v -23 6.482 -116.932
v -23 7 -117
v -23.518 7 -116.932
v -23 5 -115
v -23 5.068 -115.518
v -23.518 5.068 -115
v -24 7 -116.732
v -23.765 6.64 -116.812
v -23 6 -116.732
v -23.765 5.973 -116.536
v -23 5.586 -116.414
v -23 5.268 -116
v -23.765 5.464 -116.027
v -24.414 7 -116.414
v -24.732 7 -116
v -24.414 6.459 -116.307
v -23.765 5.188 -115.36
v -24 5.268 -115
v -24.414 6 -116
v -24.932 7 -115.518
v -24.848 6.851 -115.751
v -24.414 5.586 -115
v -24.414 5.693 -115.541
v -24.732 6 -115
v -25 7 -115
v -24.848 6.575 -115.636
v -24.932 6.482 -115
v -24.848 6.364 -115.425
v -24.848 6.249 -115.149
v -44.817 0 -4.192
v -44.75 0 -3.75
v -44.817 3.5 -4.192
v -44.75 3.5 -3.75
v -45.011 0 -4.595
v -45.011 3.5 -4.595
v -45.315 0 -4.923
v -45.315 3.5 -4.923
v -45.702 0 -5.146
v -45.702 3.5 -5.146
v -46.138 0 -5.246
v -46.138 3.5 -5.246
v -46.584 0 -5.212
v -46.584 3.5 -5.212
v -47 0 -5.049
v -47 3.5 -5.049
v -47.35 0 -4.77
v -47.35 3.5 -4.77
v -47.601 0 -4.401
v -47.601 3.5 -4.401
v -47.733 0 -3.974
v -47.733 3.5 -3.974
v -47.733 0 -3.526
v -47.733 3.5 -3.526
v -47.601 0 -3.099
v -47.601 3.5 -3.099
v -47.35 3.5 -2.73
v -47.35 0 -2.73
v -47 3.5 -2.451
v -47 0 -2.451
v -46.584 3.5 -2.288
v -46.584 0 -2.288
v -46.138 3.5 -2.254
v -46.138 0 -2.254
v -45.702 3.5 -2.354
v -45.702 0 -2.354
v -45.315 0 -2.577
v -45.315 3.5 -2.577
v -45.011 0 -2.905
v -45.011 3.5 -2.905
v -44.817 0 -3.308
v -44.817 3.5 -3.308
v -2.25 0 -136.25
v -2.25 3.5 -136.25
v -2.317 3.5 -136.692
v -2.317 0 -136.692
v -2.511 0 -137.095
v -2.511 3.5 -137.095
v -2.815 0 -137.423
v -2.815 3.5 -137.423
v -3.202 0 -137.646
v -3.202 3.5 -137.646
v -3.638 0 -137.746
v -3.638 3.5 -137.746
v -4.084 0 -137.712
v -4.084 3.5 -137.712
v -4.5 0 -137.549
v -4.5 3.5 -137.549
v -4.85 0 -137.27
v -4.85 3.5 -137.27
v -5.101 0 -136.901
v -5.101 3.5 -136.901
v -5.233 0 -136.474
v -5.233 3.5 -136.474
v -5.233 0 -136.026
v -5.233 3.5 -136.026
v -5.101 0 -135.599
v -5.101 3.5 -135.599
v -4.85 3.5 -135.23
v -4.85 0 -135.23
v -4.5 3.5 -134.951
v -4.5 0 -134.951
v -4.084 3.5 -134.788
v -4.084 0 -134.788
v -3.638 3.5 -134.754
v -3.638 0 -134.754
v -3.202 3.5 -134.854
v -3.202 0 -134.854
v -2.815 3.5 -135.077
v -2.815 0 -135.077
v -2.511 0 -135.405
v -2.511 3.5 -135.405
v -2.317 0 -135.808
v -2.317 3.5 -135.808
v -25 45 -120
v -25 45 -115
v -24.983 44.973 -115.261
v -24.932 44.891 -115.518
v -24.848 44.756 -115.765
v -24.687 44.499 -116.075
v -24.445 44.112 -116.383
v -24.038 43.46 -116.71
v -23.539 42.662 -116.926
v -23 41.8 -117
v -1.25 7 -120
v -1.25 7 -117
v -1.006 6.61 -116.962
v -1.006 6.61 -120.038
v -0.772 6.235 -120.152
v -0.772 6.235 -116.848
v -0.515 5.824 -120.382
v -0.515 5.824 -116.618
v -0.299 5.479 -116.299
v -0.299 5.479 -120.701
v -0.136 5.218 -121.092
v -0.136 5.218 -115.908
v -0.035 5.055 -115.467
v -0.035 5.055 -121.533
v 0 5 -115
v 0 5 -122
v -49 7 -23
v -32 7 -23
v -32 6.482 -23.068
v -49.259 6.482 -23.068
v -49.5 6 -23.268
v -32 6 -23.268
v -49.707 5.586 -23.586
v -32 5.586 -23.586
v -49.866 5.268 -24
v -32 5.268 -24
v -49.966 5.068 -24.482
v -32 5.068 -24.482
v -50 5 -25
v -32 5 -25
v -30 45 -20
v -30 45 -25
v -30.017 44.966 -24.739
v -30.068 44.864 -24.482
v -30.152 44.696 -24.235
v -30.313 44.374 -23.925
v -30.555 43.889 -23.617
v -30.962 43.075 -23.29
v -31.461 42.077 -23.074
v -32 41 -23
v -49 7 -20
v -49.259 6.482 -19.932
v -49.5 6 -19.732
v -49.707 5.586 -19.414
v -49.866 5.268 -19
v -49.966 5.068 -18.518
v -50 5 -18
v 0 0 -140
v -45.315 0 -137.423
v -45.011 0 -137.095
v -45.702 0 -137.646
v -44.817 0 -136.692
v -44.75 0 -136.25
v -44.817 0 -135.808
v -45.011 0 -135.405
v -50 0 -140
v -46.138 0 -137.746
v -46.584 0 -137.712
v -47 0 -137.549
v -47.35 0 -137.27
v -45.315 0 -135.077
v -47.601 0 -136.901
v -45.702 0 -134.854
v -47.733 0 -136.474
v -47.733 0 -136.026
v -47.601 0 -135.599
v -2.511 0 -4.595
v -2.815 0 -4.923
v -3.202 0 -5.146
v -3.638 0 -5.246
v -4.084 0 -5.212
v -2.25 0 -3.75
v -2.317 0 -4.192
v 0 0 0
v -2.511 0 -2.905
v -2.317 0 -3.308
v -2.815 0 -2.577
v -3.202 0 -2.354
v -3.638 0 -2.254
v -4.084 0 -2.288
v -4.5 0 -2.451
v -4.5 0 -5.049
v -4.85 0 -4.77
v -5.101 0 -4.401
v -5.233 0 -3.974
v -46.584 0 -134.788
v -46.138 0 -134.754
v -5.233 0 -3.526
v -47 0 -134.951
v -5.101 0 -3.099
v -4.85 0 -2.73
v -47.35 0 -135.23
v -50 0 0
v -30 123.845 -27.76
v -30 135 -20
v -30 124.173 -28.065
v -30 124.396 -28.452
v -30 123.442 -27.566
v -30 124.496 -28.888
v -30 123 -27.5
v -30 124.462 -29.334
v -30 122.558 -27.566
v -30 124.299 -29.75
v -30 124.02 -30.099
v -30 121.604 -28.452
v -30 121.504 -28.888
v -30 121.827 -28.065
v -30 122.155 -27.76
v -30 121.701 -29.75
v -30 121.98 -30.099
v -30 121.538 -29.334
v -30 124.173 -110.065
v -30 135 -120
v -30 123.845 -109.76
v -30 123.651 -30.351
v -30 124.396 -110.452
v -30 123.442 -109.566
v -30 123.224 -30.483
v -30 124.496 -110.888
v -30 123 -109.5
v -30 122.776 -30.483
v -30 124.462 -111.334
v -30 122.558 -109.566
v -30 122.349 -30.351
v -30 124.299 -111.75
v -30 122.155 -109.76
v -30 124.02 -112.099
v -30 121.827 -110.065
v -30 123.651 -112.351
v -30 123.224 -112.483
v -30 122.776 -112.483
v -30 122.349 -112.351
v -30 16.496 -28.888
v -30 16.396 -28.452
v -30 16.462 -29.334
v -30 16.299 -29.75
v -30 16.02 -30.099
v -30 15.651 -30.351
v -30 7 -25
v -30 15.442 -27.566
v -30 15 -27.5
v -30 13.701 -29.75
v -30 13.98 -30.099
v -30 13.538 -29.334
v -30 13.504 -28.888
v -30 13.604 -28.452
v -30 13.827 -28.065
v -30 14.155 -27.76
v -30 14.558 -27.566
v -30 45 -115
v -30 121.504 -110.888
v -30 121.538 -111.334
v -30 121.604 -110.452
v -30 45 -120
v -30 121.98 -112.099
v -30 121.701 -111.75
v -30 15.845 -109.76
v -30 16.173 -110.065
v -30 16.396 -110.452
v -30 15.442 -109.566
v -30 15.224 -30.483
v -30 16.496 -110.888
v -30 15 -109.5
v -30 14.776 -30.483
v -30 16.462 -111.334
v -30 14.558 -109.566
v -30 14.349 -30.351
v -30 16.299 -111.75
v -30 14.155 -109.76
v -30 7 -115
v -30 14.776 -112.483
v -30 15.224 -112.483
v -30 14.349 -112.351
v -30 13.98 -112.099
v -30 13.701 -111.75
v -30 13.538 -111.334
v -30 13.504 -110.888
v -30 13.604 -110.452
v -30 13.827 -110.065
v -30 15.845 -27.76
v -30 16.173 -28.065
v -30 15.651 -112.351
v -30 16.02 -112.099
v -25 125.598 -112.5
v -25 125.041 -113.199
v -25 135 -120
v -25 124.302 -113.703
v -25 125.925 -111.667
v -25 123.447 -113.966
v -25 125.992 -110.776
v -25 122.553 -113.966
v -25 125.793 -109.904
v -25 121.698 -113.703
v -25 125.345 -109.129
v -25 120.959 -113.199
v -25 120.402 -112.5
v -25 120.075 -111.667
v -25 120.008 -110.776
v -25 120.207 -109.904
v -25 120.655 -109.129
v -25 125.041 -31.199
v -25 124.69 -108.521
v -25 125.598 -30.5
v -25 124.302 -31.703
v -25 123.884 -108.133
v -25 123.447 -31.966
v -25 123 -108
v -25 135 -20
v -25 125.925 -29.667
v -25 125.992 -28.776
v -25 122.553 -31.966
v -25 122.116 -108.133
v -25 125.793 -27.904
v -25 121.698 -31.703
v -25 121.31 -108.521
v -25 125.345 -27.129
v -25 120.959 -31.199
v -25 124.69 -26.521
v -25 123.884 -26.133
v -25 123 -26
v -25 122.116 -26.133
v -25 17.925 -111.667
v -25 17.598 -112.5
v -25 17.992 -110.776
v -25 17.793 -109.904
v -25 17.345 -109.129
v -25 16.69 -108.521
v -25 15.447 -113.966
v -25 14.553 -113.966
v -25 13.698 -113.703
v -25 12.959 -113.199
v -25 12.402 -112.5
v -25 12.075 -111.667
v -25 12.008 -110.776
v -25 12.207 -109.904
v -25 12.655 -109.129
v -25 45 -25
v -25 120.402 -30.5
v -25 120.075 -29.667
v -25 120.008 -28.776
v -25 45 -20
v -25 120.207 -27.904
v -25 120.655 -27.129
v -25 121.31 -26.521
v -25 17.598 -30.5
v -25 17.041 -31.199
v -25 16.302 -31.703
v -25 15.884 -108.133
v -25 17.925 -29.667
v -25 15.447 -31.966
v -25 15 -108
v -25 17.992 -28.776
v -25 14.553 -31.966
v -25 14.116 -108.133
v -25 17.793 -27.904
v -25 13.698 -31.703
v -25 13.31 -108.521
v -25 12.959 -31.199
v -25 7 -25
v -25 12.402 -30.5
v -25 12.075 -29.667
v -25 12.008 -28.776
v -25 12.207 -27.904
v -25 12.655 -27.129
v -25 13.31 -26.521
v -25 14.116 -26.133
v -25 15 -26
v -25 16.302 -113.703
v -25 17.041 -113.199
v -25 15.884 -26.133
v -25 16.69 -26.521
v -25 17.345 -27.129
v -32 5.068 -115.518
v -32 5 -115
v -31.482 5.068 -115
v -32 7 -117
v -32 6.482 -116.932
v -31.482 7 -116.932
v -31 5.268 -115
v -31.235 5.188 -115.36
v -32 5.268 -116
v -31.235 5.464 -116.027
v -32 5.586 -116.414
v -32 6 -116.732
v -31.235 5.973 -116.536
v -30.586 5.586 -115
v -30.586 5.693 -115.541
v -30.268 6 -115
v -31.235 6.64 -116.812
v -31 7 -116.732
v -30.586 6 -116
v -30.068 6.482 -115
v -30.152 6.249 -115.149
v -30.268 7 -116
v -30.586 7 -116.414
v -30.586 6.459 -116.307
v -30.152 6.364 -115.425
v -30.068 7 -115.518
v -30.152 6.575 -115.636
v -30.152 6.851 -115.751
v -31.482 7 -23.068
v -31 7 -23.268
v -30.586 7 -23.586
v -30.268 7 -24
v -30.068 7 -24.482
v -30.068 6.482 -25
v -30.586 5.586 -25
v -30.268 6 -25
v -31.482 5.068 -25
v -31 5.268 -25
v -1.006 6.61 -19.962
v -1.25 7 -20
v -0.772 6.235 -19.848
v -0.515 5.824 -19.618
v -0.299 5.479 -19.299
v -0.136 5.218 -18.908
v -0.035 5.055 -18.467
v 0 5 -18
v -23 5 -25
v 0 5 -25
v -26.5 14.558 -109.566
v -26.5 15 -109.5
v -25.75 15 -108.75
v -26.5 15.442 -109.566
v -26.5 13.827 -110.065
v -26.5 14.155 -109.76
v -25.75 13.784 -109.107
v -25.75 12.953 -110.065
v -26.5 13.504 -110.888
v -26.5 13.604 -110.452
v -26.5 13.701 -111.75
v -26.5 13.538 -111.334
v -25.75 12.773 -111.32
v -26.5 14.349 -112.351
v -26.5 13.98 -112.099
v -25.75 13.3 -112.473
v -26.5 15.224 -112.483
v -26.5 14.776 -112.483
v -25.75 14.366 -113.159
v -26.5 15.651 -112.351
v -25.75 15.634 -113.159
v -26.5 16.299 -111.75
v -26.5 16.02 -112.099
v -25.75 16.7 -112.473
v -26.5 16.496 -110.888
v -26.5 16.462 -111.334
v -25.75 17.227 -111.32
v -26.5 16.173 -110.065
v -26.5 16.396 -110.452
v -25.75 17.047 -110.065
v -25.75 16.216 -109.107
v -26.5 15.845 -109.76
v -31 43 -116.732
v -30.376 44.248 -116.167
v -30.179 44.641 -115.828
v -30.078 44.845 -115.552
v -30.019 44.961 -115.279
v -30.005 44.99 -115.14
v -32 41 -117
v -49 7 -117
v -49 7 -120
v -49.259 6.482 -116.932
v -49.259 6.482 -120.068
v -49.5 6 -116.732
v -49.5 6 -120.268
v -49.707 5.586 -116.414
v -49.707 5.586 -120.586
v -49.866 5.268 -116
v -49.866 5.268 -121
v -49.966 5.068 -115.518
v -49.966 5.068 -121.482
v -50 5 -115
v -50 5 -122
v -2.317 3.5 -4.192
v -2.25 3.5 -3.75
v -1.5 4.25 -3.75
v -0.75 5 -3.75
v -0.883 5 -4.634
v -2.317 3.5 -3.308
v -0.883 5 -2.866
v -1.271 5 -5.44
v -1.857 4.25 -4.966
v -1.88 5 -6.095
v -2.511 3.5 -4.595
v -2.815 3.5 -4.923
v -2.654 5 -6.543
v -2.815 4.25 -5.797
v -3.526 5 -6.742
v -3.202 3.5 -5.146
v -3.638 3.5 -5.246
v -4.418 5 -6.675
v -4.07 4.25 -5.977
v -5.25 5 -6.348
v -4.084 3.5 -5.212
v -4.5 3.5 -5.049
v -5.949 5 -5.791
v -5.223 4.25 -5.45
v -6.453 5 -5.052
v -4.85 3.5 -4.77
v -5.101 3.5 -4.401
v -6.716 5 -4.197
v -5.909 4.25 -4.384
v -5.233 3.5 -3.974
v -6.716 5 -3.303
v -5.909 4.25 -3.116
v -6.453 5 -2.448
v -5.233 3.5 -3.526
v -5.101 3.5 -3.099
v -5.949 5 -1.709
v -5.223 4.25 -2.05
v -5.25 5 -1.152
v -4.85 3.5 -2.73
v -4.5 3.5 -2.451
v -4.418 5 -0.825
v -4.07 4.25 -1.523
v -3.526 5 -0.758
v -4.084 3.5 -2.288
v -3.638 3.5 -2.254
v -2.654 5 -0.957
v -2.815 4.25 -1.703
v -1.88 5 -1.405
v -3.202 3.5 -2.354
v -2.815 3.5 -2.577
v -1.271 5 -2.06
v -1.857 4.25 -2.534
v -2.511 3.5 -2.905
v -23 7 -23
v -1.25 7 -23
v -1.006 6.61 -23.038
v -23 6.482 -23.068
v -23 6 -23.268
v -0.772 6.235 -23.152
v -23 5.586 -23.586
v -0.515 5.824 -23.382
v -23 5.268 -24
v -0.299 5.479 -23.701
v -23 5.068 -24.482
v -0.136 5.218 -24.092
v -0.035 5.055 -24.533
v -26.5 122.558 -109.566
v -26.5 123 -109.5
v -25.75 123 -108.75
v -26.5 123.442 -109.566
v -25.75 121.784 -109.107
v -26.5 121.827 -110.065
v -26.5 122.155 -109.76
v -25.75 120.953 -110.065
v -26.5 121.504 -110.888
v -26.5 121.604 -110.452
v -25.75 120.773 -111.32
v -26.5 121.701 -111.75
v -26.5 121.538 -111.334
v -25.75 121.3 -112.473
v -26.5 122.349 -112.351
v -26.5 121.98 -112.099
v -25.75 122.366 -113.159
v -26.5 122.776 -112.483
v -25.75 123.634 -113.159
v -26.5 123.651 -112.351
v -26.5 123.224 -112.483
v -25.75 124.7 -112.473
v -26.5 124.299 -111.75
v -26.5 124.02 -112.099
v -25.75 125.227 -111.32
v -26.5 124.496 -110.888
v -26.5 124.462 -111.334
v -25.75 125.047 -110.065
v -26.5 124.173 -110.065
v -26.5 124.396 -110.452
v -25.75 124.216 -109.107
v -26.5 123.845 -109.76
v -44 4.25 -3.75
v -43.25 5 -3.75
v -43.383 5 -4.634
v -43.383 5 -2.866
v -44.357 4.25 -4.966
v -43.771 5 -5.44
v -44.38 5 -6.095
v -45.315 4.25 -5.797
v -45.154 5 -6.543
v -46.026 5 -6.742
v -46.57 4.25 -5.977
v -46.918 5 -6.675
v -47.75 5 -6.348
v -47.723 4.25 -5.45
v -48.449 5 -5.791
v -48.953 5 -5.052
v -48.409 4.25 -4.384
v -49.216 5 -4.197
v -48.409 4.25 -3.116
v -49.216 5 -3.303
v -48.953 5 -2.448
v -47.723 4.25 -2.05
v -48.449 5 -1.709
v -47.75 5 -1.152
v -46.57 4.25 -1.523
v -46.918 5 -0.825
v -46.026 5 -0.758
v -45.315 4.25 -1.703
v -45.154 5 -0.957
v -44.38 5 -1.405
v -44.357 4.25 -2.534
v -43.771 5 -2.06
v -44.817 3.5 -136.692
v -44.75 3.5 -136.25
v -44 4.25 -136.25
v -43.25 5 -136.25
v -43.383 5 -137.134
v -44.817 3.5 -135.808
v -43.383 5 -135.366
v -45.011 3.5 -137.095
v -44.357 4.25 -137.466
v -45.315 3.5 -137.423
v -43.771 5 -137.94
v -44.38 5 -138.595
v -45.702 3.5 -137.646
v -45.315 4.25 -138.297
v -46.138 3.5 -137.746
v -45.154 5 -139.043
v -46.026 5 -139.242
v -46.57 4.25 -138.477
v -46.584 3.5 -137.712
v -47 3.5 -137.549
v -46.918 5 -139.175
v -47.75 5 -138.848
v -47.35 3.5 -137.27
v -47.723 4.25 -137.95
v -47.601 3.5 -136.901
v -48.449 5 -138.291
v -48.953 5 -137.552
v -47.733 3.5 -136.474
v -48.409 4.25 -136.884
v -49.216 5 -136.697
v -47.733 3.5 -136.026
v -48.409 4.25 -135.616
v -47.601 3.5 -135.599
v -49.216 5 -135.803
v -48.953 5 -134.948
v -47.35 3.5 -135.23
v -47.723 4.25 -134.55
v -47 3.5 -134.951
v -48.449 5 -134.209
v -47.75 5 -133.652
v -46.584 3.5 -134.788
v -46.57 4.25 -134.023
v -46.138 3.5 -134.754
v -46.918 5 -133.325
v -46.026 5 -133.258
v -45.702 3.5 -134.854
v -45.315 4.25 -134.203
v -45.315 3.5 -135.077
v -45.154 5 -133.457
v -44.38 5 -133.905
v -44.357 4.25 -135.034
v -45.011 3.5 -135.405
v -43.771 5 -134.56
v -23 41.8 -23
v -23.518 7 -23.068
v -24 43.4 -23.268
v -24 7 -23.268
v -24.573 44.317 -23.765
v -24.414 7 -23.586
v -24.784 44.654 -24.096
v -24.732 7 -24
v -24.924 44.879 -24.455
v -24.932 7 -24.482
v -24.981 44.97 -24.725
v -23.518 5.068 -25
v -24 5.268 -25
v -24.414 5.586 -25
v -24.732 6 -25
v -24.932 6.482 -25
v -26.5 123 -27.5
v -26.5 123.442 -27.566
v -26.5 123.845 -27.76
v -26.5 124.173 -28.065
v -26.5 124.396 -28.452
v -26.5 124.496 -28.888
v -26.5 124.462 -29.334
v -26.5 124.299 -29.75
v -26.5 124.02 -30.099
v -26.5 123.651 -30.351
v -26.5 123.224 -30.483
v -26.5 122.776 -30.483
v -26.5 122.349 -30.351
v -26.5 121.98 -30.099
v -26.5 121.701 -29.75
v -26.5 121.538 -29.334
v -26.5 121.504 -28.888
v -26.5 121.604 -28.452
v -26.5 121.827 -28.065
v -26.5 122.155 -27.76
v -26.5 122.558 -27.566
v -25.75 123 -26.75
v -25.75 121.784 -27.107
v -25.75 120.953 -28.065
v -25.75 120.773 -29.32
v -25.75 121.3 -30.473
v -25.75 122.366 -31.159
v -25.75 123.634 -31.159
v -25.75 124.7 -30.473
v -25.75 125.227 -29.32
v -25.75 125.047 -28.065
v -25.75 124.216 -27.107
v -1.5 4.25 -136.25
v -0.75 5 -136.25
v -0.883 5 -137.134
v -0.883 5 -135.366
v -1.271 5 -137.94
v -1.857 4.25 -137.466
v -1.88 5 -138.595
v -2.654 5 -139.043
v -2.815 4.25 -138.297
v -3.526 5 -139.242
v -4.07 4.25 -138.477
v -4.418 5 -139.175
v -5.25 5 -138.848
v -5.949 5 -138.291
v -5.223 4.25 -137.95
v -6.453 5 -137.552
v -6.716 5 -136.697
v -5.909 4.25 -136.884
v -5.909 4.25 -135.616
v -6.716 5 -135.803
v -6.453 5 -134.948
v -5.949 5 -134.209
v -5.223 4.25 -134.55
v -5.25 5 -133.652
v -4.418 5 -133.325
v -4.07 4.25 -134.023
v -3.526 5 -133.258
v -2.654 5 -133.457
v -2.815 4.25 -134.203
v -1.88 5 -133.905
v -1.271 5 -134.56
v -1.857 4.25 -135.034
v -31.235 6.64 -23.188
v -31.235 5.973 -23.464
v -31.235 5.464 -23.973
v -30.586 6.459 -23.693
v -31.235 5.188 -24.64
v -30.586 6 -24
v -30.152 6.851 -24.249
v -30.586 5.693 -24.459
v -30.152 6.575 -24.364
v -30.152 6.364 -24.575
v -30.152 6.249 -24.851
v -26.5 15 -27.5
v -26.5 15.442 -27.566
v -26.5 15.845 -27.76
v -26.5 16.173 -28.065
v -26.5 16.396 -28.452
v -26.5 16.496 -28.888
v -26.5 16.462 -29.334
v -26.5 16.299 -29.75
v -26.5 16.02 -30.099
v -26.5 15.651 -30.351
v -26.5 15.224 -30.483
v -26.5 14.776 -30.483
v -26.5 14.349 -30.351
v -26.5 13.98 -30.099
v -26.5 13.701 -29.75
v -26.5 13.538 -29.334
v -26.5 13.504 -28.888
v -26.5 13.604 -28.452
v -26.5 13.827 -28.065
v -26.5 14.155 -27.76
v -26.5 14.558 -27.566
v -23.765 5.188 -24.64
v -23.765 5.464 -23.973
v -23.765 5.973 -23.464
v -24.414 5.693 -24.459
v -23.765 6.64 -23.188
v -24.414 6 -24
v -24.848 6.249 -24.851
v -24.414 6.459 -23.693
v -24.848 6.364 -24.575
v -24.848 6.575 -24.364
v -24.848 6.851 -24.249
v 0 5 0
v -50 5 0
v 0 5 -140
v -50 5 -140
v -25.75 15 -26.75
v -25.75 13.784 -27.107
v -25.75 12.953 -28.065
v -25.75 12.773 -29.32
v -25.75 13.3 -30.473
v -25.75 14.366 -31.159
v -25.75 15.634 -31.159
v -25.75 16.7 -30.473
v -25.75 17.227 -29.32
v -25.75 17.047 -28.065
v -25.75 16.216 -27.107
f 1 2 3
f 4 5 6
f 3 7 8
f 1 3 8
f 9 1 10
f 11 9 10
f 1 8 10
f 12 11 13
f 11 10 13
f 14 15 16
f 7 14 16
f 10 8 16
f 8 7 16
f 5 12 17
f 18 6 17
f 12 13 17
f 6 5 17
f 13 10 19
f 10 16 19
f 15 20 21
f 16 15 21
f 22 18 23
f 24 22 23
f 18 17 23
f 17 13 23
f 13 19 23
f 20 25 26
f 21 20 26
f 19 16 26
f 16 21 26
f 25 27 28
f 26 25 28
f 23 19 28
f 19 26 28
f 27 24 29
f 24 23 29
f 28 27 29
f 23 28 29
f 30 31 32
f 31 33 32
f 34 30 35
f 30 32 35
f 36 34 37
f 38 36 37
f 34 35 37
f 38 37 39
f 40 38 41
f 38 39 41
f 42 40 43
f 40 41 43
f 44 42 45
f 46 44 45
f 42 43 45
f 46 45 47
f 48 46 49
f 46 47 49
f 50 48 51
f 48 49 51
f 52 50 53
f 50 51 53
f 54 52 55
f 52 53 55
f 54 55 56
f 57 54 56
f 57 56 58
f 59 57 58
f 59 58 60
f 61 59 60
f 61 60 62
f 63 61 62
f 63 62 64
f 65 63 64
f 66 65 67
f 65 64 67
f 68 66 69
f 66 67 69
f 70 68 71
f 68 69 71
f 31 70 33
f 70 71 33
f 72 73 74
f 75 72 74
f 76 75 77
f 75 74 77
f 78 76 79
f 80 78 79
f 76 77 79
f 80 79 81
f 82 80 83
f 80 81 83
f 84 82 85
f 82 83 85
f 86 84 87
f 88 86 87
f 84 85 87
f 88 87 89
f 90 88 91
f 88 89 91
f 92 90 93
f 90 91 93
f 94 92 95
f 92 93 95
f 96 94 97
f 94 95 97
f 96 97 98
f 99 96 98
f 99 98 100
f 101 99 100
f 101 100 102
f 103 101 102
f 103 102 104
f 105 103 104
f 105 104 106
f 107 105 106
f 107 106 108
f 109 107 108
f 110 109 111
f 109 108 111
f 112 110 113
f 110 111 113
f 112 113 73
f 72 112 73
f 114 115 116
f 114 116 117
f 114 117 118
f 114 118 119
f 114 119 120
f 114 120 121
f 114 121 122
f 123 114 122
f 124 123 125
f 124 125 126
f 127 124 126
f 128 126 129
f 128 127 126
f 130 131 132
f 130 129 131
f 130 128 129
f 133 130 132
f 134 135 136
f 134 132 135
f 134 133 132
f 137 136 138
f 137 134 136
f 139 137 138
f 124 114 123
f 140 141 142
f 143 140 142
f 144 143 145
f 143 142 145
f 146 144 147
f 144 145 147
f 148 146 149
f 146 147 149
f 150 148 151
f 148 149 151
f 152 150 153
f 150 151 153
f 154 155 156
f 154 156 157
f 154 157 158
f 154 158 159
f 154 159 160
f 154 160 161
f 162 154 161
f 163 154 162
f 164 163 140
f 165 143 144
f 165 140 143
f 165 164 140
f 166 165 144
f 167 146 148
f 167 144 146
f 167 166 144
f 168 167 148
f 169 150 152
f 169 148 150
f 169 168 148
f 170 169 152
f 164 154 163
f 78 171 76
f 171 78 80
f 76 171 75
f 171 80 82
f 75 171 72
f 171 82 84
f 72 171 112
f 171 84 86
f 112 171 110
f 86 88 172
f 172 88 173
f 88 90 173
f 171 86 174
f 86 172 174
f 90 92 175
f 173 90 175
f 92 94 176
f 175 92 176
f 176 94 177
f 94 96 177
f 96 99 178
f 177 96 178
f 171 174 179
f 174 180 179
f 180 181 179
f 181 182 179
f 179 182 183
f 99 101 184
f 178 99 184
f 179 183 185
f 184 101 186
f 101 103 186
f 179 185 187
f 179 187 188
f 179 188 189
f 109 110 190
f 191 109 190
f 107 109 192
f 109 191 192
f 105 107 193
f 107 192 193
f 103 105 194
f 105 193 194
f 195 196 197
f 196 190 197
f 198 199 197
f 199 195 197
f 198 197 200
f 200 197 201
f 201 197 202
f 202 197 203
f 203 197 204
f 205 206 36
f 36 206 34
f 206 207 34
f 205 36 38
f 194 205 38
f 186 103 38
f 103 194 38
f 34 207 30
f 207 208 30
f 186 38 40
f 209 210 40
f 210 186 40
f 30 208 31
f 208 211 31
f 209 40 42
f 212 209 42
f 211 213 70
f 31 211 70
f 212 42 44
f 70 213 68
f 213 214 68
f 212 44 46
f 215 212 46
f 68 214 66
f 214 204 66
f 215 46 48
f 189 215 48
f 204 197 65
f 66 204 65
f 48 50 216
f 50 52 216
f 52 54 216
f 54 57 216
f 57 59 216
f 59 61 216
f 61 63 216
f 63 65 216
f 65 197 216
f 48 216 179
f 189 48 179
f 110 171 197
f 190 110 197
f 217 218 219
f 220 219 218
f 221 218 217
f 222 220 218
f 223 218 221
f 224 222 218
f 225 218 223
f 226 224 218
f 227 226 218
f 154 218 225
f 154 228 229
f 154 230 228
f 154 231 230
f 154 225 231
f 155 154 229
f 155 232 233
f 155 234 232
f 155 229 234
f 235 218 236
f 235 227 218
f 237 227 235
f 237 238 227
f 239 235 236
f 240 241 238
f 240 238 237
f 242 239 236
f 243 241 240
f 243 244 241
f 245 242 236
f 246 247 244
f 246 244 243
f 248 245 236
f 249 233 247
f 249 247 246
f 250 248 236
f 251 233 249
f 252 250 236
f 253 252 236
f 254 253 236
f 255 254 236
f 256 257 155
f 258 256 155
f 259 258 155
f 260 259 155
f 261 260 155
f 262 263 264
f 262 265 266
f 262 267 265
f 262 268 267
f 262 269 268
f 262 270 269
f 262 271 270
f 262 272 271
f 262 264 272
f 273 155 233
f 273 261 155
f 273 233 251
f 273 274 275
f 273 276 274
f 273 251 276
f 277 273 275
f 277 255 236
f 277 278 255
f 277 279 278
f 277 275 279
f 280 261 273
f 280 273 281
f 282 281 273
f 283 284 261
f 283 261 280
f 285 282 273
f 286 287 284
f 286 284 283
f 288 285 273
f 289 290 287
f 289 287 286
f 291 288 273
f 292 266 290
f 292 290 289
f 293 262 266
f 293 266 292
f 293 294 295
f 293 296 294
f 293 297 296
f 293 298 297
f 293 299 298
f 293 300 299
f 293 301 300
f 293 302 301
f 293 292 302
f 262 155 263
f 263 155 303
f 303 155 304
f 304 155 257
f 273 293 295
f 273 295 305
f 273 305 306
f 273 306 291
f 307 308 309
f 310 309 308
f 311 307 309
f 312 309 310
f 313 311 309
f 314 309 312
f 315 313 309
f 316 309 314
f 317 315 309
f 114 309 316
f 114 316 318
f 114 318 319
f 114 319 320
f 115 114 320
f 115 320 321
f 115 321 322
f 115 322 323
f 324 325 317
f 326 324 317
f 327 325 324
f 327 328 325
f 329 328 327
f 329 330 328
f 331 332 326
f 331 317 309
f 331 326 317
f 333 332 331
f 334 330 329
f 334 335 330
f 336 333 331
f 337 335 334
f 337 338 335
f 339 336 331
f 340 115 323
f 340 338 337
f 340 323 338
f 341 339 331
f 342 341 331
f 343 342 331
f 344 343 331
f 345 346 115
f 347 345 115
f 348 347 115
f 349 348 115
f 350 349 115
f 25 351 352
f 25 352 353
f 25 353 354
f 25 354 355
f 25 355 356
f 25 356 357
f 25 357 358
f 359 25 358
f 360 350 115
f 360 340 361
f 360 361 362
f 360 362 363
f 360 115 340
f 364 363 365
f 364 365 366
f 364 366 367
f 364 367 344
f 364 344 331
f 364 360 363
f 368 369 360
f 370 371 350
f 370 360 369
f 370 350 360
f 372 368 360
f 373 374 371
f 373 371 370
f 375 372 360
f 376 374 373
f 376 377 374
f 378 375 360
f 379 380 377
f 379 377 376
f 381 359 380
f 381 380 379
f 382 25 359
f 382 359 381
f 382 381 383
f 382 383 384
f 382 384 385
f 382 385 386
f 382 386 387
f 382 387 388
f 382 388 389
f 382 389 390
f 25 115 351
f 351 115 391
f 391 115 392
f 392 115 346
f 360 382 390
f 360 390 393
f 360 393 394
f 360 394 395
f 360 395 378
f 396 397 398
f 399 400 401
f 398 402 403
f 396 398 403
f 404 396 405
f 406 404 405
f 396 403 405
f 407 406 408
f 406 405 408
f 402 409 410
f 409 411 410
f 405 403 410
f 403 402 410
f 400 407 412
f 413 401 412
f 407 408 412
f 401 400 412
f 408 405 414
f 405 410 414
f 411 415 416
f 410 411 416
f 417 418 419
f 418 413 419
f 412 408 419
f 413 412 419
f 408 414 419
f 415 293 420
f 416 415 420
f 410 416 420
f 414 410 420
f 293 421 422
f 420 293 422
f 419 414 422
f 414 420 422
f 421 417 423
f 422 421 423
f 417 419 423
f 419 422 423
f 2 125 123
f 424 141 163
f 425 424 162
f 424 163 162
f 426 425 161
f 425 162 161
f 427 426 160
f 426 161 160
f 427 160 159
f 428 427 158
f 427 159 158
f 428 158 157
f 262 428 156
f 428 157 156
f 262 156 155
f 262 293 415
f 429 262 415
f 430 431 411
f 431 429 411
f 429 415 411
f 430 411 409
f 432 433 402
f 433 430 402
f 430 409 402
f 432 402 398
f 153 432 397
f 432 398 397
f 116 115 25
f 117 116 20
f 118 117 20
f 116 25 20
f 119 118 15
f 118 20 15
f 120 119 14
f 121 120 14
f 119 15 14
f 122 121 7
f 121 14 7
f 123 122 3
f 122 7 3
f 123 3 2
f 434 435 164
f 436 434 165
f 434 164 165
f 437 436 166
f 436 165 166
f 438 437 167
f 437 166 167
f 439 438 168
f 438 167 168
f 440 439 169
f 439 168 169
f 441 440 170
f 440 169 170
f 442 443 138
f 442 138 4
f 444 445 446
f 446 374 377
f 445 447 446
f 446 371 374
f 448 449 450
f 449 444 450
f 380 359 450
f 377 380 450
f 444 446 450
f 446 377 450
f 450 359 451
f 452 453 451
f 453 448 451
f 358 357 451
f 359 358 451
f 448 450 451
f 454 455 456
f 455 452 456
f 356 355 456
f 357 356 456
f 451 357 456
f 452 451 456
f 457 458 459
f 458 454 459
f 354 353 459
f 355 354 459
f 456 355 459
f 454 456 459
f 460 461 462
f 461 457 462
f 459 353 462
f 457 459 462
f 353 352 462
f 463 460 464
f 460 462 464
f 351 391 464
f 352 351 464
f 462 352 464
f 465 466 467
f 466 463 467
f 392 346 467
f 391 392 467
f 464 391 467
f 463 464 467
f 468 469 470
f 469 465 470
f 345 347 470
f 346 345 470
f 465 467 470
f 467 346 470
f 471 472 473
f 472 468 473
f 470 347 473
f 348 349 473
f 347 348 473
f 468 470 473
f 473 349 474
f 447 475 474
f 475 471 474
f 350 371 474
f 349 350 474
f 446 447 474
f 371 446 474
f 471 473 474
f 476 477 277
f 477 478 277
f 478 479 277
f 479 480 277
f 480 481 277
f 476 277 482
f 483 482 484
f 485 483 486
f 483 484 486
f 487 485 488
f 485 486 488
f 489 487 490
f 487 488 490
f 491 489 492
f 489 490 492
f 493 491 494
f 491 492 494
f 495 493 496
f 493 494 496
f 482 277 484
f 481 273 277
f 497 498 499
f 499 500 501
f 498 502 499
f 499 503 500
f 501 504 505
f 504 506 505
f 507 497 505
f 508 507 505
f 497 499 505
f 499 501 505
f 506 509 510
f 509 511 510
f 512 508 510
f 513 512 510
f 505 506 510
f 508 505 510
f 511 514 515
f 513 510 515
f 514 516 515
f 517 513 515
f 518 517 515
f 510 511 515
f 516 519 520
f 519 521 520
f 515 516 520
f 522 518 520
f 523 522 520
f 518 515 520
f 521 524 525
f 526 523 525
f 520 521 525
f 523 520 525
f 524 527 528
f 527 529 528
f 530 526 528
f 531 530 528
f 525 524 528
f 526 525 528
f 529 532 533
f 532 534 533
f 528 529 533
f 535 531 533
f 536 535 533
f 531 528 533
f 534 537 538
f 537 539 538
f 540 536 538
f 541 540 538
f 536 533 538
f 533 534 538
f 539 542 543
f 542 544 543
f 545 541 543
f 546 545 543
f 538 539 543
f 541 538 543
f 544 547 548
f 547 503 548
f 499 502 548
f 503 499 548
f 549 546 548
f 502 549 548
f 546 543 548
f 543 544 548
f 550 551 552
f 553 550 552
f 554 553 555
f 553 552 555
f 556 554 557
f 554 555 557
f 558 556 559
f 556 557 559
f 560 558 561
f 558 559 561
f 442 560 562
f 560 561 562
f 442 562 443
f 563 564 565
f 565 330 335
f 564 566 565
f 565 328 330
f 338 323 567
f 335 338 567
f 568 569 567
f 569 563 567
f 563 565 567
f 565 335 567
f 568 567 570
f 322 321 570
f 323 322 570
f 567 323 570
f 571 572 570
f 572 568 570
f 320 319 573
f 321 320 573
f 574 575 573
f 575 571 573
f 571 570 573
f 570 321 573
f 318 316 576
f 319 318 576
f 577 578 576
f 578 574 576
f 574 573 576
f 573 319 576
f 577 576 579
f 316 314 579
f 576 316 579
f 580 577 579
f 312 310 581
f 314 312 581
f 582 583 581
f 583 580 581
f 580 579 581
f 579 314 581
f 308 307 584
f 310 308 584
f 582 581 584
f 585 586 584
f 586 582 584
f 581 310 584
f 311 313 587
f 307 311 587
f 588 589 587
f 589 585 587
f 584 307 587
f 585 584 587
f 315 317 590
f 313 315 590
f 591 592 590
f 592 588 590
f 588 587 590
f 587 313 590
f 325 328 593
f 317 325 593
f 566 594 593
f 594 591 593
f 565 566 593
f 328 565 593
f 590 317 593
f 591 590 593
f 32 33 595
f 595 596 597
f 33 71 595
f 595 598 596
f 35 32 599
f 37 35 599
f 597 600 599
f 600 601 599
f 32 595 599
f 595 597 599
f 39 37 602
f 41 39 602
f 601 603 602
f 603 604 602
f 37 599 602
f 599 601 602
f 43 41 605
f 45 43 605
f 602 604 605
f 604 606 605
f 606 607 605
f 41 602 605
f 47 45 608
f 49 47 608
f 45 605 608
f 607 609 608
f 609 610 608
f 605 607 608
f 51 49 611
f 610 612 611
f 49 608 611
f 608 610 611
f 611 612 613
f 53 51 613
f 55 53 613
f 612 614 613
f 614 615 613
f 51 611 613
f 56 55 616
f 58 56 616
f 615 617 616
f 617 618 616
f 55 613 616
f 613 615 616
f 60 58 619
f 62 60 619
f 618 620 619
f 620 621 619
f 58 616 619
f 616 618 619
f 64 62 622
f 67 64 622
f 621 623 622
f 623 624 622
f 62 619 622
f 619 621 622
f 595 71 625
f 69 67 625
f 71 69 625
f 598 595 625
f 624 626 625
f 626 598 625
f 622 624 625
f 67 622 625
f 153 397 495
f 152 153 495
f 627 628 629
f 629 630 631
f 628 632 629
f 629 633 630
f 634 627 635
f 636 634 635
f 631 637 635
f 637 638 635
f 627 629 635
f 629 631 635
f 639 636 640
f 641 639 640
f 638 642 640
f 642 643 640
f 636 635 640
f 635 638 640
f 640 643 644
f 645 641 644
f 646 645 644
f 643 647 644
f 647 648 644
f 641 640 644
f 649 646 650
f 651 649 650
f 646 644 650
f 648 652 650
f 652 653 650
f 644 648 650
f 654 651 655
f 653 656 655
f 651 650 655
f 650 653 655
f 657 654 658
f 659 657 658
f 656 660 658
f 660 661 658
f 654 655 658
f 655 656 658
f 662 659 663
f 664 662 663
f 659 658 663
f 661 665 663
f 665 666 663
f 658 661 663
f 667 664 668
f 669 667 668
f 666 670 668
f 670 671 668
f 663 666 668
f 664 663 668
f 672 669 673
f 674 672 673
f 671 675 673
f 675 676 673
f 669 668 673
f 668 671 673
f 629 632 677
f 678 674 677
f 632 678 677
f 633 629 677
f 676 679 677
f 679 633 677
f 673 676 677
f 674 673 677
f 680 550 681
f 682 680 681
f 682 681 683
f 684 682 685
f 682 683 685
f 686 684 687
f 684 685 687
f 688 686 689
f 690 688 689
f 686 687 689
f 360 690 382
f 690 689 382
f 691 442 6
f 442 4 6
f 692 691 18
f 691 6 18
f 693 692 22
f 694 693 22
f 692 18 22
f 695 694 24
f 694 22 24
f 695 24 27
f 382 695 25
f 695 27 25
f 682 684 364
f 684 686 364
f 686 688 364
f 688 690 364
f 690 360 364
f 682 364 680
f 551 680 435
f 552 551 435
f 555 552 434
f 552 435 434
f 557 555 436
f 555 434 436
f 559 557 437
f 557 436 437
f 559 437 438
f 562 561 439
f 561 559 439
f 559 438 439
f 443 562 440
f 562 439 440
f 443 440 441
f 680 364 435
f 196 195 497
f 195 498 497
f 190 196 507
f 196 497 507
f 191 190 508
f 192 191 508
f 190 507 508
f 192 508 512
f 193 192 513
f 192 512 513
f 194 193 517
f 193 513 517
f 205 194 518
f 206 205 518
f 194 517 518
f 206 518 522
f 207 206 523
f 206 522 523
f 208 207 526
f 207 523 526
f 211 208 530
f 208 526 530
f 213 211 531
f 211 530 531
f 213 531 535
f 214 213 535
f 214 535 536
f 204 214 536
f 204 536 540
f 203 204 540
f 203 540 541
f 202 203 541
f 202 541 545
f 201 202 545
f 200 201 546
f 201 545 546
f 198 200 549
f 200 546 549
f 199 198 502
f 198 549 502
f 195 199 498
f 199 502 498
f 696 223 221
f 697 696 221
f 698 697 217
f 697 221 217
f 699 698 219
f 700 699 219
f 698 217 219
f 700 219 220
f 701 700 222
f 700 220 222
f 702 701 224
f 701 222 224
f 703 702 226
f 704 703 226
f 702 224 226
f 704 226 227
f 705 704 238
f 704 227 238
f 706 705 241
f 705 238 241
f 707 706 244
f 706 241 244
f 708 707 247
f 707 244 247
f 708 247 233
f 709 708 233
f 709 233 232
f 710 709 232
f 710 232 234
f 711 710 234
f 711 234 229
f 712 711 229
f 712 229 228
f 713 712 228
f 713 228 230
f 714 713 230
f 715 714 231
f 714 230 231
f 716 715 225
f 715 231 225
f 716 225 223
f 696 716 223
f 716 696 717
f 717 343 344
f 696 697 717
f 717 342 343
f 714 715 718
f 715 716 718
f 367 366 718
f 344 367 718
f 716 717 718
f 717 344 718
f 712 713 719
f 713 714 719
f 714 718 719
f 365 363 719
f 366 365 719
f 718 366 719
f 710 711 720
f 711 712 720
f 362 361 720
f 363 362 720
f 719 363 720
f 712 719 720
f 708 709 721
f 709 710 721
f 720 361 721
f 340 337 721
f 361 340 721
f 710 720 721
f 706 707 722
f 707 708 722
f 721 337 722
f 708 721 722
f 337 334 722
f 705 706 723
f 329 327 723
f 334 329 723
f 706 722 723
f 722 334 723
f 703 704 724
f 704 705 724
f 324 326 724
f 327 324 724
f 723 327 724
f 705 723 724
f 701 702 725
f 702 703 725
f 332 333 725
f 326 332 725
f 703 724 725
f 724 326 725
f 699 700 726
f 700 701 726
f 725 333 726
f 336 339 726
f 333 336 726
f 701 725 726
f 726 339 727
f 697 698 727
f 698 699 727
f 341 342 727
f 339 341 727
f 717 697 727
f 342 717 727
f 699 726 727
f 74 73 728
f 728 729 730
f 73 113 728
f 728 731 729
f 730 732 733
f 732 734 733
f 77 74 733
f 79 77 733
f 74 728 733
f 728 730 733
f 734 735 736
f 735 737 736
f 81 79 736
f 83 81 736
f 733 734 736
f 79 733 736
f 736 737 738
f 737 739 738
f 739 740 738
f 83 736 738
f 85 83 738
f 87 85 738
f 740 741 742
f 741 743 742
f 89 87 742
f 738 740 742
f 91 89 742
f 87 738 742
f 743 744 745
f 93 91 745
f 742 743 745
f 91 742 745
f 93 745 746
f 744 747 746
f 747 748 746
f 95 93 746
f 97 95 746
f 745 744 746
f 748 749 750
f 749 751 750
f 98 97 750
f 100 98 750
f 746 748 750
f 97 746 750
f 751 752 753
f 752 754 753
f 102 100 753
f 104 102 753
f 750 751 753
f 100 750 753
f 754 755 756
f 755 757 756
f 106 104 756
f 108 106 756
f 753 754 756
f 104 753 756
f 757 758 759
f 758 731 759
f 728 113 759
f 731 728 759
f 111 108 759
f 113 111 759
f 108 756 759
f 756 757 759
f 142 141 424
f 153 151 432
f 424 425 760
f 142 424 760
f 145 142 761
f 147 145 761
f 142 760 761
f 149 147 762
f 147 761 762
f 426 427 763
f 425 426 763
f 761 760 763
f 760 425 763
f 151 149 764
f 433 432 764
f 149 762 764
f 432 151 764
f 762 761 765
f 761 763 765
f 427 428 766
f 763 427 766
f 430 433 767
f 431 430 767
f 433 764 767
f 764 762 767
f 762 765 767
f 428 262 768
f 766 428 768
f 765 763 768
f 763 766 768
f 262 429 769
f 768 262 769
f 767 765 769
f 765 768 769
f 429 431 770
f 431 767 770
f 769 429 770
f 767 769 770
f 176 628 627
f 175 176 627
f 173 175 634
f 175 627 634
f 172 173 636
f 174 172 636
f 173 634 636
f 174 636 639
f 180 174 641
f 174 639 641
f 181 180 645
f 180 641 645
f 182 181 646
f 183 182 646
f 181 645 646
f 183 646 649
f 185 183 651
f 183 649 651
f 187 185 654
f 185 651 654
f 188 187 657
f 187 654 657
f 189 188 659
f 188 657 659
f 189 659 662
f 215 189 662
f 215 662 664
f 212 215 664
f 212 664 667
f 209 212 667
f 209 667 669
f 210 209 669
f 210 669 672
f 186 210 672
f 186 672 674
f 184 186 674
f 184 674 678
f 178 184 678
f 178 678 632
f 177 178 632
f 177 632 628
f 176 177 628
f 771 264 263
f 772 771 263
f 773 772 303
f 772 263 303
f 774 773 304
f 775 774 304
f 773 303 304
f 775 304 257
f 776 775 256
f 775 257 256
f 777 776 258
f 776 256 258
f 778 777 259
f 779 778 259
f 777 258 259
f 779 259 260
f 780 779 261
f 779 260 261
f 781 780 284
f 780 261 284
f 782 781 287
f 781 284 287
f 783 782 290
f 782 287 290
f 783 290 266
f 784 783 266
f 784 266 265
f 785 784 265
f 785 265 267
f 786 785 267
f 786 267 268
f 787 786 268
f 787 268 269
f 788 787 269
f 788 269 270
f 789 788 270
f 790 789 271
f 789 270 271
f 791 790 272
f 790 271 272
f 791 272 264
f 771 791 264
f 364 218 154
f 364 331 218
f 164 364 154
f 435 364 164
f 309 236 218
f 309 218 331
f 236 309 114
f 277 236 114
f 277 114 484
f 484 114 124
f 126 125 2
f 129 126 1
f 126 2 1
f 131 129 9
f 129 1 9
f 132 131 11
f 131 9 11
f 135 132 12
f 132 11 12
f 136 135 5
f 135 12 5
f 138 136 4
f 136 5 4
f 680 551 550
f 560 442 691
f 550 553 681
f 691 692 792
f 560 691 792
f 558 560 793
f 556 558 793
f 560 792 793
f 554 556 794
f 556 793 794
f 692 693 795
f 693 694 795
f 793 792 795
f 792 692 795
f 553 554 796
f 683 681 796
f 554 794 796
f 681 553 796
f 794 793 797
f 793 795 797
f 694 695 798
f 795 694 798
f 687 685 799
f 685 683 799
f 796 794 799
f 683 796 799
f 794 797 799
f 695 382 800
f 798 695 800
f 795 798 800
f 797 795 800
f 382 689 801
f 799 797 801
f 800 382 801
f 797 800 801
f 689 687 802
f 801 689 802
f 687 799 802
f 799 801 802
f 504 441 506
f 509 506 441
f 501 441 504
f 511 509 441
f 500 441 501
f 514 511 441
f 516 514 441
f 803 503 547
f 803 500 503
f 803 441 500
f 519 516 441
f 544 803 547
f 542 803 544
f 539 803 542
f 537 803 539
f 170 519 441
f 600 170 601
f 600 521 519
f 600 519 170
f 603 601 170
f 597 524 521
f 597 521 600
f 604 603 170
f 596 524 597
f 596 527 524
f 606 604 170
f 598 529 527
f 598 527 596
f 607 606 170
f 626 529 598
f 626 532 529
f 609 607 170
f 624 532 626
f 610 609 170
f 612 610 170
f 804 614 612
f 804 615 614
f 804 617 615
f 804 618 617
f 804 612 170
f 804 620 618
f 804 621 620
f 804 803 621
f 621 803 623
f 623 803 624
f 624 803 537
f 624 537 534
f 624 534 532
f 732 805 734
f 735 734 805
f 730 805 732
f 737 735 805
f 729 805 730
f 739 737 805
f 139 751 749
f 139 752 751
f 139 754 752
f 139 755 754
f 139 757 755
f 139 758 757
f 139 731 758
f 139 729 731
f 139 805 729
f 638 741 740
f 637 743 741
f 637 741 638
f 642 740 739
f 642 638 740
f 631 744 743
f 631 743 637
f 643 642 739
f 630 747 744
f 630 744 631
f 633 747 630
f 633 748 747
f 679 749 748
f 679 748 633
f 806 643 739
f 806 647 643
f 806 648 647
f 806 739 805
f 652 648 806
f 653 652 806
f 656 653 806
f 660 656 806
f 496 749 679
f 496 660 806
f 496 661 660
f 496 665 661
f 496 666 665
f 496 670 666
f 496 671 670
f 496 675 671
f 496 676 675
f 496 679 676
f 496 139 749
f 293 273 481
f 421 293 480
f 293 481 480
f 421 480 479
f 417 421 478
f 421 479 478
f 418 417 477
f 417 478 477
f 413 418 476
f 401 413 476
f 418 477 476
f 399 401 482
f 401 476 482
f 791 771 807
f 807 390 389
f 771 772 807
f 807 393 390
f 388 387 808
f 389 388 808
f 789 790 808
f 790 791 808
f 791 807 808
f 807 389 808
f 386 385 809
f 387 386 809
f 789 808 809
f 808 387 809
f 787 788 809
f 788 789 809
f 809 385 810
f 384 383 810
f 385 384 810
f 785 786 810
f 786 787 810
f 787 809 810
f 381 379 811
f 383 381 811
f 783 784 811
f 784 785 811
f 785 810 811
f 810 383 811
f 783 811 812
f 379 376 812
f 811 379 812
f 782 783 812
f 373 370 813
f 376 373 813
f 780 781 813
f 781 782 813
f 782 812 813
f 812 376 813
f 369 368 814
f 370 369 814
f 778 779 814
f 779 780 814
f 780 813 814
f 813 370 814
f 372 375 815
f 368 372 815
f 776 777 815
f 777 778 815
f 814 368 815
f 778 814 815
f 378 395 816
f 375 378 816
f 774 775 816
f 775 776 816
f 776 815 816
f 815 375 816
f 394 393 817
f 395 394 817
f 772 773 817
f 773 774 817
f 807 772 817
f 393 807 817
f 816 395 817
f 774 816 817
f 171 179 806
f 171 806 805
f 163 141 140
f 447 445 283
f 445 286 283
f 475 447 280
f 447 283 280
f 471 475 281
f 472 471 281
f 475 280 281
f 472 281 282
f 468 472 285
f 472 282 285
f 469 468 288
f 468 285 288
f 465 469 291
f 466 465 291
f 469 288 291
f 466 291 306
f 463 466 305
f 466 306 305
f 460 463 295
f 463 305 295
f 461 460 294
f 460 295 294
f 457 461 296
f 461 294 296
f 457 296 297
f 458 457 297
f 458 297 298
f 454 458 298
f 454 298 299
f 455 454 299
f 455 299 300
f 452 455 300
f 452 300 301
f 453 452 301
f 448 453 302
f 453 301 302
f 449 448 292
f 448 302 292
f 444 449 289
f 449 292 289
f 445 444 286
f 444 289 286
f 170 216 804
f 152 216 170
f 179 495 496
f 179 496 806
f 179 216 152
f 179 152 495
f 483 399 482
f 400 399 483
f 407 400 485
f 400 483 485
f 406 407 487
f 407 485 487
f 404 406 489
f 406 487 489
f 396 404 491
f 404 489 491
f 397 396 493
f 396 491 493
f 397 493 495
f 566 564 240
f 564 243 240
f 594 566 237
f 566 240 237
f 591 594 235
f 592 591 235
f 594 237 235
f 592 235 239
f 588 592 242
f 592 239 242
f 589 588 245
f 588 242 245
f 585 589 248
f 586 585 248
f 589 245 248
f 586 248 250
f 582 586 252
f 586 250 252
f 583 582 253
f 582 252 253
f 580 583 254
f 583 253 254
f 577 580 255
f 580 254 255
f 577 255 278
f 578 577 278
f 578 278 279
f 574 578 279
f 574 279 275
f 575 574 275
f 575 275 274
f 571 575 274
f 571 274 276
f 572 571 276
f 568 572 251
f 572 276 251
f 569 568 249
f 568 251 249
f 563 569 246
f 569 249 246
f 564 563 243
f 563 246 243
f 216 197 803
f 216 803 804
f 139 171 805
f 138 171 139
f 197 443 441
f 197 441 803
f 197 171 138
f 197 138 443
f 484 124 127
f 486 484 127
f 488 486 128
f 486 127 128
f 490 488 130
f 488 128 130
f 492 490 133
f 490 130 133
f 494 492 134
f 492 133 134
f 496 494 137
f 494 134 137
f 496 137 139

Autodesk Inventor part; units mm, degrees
ref_plane "YZ Plane" through (0, 0, 0) normal (1, 0, 0) x (0, 1, 0)
ref_plane "XZ Plane" through (0, 0, 0) normal (0, 1, 0) x (-1, 0, 0)
ref_plane "XY Plane" through (0, 0, 0) normal (0, 0, 1) x (1, 0, 0)
sketch "Sketch1" plane through (0, 0, 0) normal (0, 1, 0) x (-1, 0, 0)
  line L0 (0, 0) -> (46, 0)
  line L1 (0, -135) -> (0, 0)
  line L2 (0, 0) -> (50, 0)
  line L3 (50, 0) -> (50, -140)
  line L4 (50, -140) -> (0, -140)
  line L5 (0, -140) -> (0, 0)
  dimension "d36" = 50
  dimension "d37" = 140
extrude "Extrusion1" add sketch "Sketch1" along normal blind 5
sketch "Sketch2" plane through (0, 5, 0) normal (0, 1, 0) x (1, 0, 0)
  line L0 (0, 2.5) -> (17, 2.5) construction
  circle A0 centre (-3.75, 136.25) radius 1.5
  circle A1 centre (-46.25, 136.25) radius 1.5
  line L1 (0, 0) -> (-3.75, 0)
  circle A2 centre (-3.75, 3.75) radius 1.5
  circle A3 centre (-46.25, 3.75) radius 1.5
  point P0 (0, 135)
  point P1 (-50, 140)
  point P2 (0, 140)
  dimension "d103" = 3
  dimension "d106" = 3
  dimension "d109" = 3
  dimension "d110" = 3
extrude "Extrusion4" cut sketch "Sketch2" against normal through all
sketch "Sketch3" plane through (0, 5, 0) normal (0, 1, 0) x (1, 0, 0)
  line L0 (0, 0) -> (0, 140) projected
  line L1 (0, 70) -> (-25, 70)
  line L2 (0, 140) -> (-50, 140) projected
  line L3 (-25, 70) -> (-30, 70)
  line L4 (-30, 115) -> (-30, 70)
  line L5 (-30, 25) -> (-30, 70)
  line L6 (-30, 115) -> (-25, 115)
  line L7 (-25, 115) -> (-25, 25)
  line L8 (-25, 25) -> (-30, 25)
  line L9 (-30, 25) -> (-30, 115)
  line L10 (-25, 115) -> (-30, 115)
  line L11 (-30, 115) -> (-30, 120)
  line L12 (-30, 120) -> (-25, 120)
  line L13 (-25, 120) -> (-25, 115)
  line L14 (-25, 25) -> (-30, 25)
  line L15 (-30, 25) -> (-30, 20)
  line L16 (-30, 20) -> (-25, 20)
  line L17 (-25, 20) -> (-25, 25)
  dimension "d55" = 5
  dimension "d56" = 5
extrude "Extrusion5" add sketch "Sketch3" along normal blind 130
sketch "Sketch5" plane through (-30, 5, -120) normal (-1, 0, 0) x (0, 0, 1)
  line L0 (100, 0) -> (100, 130) projected
  line L1 (120, 0) -> (-20, 0) projected
  circle A0 centre (9.0002, 118) radius 1.5
  circle A1 centre (91.0002, 118) radius 1.5
  circle A2 centre (91.0002, 10) radius 1.5
  circle A3 centre (9.0002, 10) radius 1.5
  point P0 (120, -5)
  dimension "d62" = 3
  dimension "d63" = 3
  dimension "d64" = 3
  dimension "d65" = 3
extrude "Extrusion6" cut sketch "Sketch5" against normal up to surface (5 mm away)
sketch "Sketch6" plane through (-30, 5, -120) normal (-1, 0, 0) x (0, 0, 1)
  line L0 (0, 0) -> (3, 0)
  line L1 (3, 0) -> (3, 40)
  line L2 (3, 40) -> (0, 40)
  line L3 (0, 40) -> (0, 0)
  line L4 (100, 0) -> (0, 0) projected
  line L5 (100, 0) -> (97, 0)
  line L6 (97, 0) -> (97, 40)
  line L7 (97, 40) -> (100, 40)
  line L8 (100, 40) -> (100, 0)
  point P0 (120, -5)
  dimension "d68" = 3
  dimension "d69" = 40
  dimension "d70" = 3
  dimension "d71" = 40
extrude "Extrusion7" add sketch "Sketch6" along normal blind 20 and the other way blind 30
sketch "Sketch7" plane through (0, 5, -120) normal (0, 0, -1) x (-1, 0, 0)
  line L0 (0, 40) -> (25, 40) projected
  line L1 (50, 0) -> (50, 40) projected
  line L2 (0, 40) -> (50, 40)
  line L3 (50, 40) -> (50, 0)
  line L4 (50, 0) -> (0, 0)
  line L5 (0, 0) -> (0, 40)
  line L6 (50, 0) -> (0, 0) projected
  line L7 (25, 40) -> (0, 0)
  line L8 (30, 40) -> (50, 0)
  point P0 (0, -5)
sketch "Sketch8" plane through (-50, 5, -20) normal (0, 0, 1) x (1, 0, 0)
  line L0 (20, 40) -> (0, 40) projected
  line L1 (50, 40) -> (50, 0) projected
  line L2 (0, 40) -> (50, 40)
  line L3 (50, 40) -> (50, 0)
  line L4 (50, 0) -> (0, 0)
  line L5 (0, 0) -> (0, 40)
  line L6 (20, 40) -> (0, 0)
  line L7 (50, 40) -> (25, 40) projected
  line L8 (25, 40) -> (50, 0)
  point P0 (50, -5)
extrude "Extrusion8" cut sketch "Sketch8" against normal up to surface (3 mm away) contours L6 L5 L0 | L2 L1 L8
extrude "Extrusion9" cut sketch "Sketch7" against normal up to surface (3 mm away) contours L0 L7 L5 | L2 L1 L8
fillet "Fillet1" radius 2 8 edges at (-30, 5, -70) (-25, 5, -70) (-12.5, 5, -117) (-40, 5, -117) (-40, 5, -23) (-12.5, 5, -23) (-25, 5, -20) (-25, 5, -120)
thread "Thread5" size "M3x0.5" class "6H" standard "ANSI Metric M Profile" full length
thread "Thread6" size "M3x0.5" class "6H" standard "ANSI Metric M Profile" full length
thread "Thread7" size "M3x0.5" class "6H" standard "ANSI Metric M Profile" full length
thread "Thread8" size "M3x0.5" class "6H" standard "ANSI Metric M Profile" full length
fillet "Fillet2" radius 2 8 edges at (-30.5858, 5.5858, -23.5858) (-30, 26, -23) (-30.5858, 5.5858, -116.4142) (-30, 26, -117) (-24.4142, 5.5858, -116.4142) (-25, 26, -117) (-24.4142, 5.5858, -23.5858) (-25, 26, -23)
chamfer "Chamfer1" distance 1.5 angle 45 8 edges at (-25, 123, -30.4998) (-25, 123, -112.4998) (-25, 15, -112.4998) (-25, 15, -30.4998) (-5.25, 5, -136.25) (-47.75, 5, -136.25) (-5.25, 5, -3.75) (-47.75, 5, -3.75)
chamfer_without_effect "Chamfer2"
thread "Thread13" size "M3x0.5" class "6H" standard "ANSI Metric M Profile" full length
thread "Thread14" size "M3x0.5" class "6H" standard "ANSI Metric M Profile" full length
thread "Thread15" size "M3x0.5" class "6H" standard "ANSI Metric M Profile" full length
thread "Thread16" size "M3x0.5" class "6H" standard "ANSI Metric M Profile" full length
properties part number "support"
